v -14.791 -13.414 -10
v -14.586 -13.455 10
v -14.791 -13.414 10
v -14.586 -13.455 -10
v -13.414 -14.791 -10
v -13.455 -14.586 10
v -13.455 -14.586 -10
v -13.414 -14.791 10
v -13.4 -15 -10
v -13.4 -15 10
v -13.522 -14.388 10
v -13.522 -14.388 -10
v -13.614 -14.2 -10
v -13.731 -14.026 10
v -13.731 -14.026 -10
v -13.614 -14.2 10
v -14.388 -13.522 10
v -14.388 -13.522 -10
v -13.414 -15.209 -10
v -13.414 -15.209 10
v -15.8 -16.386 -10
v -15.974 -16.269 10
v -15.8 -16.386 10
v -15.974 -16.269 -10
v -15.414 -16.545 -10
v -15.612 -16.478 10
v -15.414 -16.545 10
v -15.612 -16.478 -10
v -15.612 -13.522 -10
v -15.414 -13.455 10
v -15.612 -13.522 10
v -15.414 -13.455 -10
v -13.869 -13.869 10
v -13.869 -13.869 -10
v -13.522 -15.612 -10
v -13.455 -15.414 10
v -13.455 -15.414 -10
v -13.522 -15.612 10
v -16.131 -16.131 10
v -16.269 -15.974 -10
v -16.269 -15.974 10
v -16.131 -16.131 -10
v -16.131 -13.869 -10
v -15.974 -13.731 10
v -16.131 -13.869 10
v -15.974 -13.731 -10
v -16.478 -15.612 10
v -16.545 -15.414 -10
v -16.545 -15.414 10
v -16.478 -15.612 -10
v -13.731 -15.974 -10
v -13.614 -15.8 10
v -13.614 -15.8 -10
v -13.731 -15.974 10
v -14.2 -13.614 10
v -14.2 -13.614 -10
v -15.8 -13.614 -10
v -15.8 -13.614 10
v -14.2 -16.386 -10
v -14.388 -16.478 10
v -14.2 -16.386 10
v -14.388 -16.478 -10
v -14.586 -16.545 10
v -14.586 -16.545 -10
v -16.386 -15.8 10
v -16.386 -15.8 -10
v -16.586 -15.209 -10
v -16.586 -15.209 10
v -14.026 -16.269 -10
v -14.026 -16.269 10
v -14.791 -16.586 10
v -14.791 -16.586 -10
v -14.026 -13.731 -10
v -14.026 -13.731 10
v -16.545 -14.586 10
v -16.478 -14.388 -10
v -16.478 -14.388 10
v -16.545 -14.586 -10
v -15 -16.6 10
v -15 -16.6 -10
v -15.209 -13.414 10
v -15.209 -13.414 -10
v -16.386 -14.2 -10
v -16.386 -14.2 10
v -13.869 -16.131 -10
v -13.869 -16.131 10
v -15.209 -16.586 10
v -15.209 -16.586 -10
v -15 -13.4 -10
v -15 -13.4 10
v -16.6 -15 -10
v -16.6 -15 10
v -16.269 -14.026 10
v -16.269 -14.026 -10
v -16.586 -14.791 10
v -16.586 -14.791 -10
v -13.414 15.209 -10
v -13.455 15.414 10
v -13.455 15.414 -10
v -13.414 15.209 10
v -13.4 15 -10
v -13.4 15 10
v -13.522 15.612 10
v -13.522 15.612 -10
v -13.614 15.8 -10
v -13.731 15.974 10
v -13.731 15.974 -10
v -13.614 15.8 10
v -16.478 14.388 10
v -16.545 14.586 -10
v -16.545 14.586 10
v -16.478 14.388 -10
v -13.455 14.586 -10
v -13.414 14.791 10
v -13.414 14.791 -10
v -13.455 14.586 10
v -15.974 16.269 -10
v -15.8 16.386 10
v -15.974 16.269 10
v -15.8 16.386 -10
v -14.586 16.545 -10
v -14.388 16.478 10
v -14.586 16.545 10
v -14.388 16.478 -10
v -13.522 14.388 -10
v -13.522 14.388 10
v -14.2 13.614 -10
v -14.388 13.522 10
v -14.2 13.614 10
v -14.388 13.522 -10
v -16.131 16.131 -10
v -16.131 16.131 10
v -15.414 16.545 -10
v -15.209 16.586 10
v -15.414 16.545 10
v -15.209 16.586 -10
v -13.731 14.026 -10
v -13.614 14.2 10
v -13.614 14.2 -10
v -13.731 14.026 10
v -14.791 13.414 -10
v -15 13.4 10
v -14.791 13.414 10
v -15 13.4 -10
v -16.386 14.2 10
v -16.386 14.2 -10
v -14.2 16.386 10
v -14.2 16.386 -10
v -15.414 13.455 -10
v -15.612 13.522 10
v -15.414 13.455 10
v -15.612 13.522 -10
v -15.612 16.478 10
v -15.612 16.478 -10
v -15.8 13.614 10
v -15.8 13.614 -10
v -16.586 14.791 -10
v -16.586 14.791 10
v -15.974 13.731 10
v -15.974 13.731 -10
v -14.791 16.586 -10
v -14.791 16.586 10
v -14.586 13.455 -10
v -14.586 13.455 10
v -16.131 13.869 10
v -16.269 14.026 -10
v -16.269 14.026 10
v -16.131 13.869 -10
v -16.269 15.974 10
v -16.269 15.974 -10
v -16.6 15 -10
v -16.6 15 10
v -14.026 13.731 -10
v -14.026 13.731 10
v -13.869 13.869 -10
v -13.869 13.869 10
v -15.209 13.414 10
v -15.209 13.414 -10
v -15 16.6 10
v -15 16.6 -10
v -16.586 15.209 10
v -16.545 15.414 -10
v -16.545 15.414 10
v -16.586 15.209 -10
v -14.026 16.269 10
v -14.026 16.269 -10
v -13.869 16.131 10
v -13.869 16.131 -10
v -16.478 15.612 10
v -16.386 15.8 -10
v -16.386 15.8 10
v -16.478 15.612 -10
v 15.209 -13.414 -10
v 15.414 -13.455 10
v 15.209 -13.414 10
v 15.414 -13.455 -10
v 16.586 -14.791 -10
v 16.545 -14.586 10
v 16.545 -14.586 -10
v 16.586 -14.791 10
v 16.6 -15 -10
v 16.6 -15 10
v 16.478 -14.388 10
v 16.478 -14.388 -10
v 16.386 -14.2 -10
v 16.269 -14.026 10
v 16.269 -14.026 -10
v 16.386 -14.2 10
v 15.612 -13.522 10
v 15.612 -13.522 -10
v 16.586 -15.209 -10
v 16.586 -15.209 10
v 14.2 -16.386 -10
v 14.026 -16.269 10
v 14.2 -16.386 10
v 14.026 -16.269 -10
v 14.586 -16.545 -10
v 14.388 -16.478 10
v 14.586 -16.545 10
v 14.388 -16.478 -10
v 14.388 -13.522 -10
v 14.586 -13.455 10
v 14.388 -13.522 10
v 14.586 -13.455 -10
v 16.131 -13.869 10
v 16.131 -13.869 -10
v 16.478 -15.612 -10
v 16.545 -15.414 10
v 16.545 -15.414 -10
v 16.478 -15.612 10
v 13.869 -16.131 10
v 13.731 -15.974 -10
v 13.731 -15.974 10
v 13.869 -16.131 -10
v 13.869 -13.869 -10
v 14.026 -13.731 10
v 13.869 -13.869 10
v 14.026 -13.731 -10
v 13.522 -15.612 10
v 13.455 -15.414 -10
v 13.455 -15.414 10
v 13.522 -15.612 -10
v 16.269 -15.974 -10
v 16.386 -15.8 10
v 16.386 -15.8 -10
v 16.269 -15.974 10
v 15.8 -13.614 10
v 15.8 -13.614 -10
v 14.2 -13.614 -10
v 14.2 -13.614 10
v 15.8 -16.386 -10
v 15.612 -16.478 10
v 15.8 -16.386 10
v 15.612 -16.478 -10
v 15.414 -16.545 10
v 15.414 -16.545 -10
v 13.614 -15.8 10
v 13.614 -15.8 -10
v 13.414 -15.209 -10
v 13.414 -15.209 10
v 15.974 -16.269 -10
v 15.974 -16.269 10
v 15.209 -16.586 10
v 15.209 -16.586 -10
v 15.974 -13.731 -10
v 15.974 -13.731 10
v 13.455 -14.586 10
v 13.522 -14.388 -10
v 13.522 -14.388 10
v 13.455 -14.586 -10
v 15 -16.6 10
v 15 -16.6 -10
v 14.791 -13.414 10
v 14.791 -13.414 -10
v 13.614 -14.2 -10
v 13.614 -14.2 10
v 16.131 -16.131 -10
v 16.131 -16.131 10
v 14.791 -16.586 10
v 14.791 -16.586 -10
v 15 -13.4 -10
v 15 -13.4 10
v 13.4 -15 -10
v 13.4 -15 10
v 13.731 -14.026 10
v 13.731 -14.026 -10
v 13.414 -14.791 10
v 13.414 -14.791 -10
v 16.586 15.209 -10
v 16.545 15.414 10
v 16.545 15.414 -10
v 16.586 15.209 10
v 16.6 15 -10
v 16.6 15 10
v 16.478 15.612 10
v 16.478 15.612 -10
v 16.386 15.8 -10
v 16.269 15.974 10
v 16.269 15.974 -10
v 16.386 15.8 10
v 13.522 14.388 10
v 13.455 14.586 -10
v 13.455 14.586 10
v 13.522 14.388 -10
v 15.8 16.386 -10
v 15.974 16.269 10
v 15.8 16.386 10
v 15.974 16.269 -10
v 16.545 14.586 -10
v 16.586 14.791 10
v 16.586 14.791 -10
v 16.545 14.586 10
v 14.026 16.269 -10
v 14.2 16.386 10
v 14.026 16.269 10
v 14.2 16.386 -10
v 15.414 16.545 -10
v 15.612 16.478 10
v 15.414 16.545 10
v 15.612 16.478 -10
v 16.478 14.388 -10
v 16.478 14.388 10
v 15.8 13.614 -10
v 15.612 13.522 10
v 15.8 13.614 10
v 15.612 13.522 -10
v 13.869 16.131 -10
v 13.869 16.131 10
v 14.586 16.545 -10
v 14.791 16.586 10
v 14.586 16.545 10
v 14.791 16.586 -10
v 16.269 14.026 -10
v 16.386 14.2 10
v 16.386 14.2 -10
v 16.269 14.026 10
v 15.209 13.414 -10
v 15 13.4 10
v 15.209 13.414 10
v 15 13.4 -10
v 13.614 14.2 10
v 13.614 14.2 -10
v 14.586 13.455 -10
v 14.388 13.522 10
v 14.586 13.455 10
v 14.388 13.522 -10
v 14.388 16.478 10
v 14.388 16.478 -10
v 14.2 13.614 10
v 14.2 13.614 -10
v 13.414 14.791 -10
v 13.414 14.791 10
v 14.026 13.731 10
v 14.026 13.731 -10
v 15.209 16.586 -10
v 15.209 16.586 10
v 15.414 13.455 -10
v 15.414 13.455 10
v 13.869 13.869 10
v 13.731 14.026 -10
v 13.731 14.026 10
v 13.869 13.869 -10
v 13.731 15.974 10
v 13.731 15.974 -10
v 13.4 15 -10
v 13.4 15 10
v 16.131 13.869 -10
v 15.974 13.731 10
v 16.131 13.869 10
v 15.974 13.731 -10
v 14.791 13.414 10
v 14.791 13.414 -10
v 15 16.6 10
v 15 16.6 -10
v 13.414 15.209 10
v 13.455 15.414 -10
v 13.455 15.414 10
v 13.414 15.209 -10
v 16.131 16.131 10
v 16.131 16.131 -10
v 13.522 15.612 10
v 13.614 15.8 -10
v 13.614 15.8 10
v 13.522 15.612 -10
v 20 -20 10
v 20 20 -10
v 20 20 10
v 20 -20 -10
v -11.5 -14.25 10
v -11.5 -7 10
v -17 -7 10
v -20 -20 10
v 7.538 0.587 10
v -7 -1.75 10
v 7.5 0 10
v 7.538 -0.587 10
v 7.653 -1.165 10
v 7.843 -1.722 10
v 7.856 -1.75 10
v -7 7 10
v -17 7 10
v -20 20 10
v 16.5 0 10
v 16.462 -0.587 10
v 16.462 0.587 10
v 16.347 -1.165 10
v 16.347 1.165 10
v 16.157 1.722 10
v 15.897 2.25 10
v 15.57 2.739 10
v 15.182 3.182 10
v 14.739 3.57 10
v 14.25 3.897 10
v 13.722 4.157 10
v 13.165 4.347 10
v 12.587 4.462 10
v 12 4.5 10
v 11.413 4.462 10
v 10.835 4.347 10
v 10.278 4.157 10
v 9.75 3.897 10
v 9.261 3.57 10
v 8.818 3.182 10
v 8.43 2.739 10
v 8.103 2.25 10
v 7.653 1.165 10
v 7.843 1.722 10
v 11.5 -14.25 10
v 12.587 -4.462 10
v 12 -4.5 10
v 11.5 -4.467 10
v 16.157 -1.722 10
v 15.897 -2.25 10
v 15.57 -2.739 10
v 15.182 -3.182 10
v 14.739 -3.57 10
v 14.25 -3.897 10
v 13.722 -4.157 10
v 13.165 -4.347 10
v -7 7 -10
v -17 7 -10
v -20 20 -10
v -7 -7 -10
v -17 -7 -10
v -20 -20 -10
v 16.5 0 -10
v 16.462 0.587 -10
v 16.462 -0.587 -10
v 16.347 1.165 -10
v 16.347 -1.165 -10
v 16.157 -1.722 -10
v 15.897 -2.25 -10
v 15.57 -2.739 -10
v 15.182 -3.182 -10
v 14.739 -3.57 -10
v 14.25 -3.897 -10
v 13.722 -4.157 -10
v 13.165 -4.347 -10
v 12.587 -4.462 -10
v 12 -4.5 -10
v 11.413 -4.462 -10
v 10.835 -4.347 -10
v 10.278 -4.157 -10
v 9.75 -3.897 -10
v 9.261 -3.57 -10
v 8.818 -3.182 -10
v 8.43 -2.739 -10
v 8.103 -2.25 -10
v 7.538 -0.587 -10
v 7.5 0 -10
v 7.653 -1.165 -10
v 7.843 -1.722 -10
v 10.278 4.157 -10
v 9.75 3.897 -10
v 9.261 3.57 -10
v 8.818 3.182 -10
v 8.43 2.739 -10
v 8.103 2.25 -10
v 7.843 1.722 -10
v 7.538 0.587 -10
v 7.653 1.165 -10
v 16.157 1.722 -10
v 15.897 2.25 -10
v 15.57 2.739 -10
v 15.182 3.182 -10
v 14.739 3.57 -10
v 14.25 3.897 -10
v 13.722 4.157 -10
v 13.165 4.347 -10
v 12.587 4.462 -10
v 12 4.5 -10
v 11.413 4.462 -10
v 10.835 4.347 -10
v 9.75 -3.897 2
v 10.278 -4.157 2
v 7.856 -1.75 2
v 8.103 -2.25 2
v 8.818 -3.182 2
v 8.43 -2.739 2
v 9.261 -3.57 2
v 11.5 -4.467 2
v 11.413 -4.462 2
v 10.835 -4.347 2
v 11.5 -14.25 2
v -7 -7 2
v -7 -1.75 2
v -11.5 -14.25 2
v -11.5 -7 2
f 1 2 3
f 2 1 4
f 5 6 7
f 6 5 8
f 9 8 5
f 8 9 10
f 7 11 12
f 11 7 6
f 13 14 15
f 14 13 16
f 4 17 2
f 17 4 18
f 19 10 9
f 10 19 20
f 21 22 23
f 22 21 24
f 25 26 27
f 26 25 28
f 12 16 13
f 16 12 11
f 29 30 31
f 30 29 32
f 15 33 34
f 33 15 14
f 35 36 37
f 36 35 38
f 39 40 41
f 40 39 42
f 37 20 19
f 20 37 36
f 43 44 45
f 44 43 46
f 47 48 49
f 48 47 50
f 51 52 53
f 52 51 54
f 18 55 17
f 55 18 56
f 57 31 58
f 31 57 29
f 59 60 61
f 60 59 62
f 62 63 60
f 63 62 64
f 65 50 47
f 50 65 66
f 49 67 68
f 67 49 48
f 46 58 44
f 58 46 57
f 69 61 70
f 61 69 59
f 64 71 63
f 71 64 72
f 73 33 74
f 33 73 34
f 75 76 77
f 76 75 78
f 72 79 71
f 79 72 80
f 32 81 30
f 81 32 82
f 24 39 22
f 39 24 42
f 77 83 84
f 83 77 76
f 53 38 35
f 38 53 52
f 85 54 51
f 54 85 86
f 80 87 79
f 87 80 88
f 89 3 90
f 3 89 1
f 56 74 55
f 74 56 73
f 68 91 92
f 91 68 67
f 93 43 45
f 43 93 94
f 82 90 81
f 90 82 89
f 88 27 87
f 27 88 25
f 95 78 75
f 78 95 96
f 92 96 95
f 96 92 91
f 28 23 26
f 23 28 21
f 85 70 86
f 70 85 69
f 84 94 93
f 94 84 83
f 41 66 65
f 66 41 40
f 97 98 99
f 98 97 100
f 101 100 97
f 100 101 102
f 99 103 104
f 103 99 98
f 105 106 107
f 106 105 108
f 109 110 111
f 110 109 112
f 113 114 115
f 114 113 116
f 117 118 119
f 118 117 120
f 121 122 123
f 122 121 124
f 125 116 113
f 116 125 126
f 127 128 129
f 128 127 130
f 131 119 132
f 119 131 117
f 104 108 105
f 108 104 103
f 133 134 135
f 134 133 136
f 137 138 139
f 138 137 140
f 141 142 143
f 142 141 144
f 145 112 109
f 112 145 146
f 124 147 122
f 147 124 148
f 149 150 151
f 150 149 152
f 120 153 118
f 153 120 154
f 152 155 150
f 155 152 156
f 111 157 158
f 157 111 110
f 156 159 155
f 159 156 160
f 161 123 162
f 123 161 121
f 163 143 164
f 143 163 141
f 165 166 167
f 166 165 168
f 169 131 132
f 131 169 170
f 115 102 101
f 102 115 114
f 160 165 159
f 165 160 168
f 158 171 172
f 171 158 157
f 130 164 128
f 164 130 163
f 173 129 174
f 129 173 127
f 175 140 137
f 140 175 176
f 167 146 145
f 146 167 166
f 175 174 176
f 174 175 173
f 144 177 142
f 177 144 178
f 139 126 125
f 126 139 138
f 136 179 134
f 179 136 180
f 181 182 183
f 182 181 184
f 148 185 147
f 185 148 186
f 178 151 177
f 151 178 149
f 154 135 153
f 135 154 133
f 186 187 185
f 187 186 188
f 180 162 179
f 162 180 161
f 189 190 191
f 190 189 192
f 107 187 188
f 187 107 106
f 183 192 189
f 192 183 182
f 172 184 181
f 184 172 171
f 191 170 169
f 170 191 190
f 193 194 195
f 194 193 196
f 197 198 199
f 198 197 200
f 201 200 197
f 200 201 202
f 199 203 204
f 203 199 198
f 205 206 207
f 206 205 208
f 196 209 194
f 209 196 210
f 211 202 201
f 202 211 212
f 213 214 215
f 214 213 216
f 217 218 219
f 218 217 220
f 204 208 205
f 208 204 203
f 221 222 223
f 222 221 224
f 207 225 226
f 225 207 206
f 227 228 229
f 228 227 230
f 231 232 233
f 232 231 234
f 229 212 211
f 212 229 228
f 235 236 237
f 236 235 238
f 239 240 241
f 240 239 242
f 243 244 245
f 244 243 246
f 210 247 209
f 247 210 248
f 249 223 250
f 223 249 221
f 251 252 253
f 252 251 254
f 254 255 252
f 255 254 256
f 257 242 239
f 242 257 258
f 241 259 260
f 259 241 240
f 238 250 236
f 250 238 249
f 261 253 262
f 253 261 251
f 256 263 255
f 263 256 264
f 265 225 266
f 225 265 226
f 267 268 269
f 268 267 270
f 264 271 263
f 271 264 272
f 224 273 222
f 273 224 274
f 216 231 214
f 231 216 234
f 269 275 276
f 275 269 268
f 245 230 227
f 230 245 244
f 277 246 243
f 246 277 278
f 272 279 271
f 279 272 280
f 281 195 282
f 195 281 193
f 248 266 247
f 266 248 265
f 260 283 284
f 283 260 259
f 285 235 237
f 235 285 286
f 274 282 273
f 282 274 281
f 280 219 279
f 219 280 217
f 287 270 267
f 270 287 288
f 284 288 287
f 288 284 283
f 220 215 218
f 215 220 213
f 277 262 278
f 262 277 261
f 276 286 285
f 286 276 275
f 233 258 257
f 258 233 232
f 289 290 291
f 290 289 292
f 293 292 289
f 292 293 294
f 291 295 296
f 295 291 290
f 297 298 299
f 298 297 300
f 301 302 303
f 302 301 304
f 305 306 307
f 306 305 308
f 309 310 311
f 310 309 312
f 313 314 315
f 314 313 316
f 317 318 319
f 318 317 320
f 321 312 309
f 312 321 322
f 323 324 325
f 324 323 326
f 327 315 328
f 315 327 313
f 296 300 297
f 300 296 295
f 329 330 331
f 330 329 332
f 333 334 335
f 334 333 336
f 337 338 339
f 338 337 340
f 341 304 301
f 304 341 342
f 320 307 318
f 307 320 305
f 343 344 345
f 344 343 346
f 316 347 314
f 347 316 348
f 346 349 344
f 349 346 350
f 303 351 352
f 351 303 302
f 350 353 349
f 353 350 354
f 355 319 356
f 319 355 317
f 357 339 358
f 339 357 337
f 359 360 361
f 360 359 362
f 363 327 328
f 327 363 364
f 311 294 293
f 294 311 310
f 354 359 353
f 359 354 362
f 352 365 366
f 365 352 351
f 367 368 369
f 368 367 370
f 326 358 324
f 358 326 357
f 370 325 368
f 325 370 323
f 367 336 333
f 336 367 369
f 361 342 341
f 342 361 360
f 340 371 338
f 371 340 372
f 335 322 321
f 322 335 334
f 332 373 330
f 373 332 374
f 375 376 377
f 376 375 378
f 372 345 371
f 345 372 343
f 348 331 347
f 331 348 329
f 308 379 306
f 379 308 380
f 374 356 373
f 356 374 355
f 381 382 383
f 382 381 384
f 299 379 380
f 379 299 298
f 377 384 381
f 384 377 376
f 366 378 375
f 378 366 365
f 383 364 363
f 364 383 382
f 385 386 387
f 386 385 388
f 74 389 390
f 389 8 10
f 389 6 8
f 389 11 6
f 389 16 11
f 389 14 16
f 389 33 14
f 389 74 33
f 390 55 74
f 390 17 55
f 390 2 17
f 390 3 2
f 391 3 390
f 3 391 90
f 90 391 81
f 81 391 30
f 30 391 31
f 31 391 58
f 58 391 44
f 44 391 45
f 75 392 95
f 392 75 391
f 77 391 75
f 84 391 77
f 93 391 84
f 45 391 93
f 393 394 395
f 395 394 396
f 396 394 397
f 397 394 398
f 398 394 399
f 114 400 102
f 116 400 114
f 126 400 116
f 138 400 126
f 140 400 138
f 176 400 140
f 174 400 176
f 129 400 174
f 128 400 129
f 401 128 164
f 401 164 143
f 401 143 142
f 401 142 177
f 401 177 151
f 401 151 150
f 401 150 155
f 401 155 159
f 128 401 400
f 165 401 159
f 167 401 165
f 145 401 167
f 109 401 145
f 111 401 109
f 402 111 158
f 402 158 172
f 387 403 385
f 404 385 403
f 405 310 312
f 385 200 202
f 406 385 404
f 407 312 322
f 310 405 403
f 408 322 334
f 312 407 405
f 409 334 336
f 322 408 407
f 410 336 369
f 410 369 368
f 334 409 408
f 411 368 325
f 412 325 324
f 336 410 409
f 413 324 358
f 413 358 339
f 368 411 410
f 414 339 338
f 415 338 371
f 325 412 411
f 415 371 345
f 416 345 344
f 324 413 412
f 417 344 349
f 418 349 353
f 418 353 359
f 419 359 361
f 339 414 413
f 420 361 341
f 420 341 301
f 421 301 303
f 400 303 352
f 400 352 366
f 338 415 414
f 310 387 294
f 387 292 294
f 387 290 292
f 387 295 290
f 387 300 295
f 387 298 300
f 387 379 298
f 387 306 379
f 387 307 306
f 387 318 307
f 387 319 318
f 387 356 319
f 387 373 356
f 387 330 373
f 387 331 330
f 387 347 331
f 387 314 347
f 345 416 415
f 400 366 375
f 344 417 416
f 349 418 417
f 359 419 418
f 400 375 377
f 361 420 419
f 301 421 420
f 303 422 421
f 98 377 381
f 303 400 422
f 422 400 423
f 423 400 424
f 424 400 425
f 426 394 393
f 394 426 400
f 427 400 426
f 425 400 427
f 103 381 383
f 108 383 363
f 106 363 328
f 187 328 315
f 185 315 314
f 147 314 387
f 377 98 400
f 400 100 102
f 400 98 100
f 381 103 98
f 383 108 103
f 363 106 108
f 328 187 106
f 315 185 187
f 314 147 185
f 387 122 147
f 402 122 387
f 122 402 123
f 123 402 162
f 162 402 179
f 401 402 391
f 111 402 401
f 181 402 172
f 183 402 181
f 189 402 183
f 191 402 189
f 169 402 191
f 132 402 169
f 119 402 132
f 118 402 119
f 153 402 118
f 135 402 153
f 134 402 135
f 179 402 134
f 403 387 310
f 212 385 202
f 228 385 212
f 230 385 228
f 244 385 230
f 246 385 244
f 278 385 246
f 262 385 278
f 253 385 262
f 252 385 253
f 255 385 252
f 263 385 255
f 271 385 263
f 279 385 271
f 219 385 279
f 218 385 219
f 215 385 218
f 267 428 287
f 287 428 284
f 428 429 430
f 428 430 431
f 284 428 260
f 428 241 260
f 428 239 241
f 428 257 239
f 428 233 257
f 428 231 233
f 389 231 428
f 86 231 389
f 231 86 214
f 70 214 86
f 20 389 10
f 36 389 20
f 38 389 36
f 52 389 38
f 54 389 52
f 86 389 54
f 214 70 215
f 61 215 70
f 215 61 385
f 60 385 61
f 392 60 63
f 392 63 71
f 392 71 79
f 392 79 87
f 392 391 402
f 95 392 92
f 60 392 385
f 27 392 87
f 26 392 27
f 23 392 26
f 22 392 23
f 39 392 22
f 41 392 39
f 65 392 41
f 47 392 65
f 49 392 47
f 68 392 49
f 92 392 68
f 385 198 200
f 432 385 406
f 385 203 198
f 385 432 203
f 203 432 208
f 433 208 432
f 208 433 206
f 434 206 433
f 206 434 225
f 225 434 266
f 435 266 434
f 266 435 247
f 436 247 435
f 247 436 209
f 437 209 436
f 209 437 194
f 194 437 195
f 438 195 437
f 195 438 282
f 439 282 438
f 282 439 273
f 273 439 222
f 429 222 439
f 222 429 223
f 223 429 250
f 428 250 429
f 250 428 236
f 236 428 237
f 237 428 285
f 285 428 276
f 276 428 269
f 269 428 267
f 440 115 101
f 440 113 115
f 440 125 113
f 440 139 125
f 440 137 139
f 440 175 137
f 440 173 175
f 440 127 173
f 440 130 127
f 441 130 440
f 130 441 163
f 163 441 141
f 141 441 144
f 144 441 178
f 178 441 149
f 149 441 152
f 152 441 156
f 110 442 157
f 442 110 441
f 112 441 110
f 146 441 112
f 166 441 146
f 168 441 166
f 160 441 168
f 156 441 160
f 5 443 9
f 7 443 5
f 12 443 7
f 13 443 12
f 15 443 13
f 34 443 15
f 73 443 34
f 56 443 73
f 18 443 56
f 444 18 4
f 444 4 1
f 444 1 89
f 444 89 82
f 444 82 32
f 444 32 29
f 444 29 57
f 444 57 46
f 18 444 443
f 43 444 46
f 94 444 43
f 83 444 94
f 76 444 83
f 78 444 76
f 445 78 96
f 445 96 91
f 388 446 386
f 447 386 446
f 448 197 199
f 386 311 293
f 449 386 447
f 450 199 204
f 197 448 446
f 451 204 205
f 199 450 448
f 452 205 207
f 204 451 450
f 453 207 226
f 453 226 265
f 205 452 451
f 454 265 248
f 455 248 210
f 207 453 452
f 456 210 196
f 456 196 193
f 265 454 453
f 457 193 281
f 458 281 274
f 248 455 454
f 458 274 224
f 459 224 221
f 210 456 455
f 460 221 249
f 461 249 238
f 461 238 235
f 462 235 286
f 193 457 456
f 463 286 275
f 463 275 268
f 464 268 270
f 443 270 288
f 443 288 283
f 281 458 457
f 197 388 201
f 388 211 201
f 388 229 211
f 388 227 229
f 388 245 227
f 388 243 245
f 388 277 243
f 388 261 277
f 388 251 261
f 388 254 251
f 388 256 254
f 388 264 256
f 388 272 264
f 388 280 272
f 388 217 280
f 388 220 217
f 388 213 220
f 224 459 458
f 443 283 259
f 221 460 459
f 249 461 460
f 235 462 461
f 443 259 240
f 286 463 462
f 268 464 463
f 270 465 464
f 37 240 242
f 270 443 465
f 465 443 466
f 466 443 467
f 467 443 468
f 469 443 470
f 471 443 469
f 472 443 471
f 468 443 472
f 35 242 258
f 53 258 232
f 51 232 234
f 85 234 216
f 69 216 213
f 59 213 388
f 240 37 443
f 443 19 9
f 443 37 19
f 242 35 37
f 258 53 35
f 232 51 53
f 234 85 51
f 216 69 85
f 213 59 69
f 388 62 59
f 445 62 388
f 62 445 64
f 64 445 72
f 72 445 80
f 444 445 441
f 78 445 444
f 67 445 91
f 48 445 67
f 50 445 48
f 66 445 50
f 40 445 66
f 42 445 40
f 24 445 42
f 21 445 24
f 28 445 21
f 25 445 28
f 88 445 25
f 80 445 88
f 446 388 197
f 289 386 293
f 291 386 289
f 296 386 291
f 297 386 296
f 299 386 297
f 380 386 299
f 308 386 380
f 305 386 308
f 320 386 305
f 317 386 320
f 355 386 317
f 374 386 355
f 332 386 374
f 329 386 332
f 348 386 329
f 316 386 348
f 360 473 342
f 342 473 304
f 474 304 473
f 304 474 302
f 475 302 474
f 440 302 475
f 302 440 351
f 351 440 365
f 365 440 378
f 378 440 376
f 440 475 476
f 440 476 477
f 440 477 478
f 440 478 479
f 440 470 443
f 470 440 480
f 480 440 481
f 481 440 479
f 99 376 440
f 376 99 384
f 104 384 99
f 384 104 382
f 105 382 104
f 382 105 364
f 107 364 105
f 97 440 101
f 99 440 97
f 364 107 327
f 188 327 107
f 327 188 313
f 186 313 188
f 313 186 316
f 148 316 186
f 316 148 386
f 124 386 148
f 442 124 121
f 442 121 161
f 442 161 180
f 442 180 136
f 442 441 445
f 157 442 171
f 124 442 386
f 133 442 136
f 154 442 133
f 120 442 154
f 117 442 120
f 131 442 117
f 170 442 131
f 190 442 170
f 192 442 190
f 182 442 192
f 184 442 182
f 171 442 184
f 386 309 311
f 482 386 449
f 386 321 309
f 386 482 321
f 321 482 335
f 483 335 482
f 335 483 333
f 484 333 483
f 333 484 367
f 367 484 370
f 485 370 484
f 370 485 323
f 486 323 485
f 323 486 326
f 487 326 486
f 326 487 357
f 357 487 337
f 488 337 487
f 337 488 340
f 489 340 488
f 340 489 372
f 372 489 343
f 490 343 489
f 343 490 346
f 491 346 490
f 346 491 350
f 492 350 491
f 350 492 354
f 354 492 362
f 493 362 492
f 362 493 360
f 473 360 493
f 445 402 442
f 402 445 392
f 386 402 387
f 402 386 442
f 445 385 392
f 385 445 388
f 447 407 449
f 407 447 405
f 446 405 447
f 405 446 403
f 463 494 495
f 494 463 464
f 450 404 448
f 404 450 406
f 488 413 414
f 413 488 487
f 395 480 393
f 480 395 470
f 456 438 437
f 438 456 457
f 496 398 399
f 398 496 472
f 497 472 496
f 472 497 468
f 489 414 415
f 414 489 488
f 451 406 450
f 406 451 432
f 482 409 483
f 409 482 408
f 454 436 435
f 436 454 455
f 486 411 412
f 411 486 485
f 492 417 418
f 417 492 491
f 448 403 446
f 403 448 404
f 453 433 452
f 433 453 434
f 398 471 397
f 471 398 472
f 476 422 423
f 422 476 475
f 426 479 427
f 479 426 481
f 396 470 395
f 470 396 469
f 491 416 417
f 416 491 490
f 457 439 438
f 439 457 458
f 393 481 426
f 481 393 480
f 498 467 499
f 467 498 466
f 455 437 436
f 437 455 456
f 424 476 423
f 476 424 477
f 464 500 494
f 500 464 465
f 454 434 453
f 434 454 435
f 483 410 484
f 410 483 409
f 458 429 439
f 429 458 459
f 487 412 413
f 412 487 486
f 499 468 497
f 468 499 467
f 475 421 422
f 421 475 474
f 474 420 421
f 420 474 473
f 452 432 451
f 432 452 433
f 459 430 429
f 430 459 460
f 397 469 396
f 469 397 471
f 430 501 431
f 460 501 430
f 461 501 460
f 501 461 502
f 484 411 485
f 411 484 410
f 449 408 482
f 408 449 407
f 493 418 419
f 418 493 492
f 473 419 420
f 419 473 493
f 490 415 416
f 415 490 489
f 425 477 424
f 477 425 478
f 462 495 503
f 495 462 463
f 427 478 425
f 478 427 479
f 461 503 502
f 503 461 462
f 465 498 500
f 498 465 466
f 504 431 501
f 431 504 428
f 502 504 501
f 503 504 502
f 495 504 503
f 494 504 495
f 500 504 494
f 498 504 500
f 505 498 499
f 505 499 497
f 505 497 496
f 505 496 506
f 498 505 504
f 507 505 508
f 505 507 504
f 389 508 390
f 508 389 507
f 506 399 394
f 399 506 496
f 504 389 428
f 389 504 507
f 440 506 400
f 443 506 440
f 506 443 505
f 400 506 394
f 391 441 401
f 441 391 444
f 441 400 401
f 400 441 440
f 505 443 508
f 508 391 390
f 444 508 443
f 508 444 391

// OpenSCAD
// file: cad_config.scad
// Shared dimensions for the reference toolhead, in millimetres.
//
// These constants are mirrored by `constants:` in cad/manifest.yaml and
// by the collision primitives in steropes/gantry.py — the drift guard in
// tests/test_cadimport.py fails if any of the three diverge.

CARRIAGE_W = 40;                    // X width  (2 * gantry.CARRIAGE_HALF_MM[0])
CARRIAGE_D = 40;                    // Y depth  (2 * gantry.CARRIAGE_HALF_MM[1])
CARRIAGE_H = 20;                    // Z height (2 * gantry.CARRIAGE_HALF_MM[2])

FINGER_DIA = 8;                     // plunger shaft Ø (2 * gantry.FINGER_RADIUS_MM)
FINGER_LEN = 30;                    // shaft length (2 * gantry.FINGER_HALF_LEN_MM)
FINGER_OFFSET = [12, 0, -25];       // toolhead frame (gantry.FINGER_OFFSET_MM)
TOOLCAM_OFFSET = [-12, 0, -11];     // toolhead frame (gantry.TOOLCAM_OFFSET_MM)

M3_CLEAR = 3.2;                     // M3 clearance hole

SERVO_W = 23;                       // 9 g servo body, for the carriage pocket
SERVO_D = 12.5;
SERVO_H = 8;

$fn = 48;
// main file
// Carriage plate: the toolhead's backbone, riding the gantry rails.
// Authored in the toolhead body frame — origin at the carriage centre,
// Z up — so the exported STL drops into the MJCF `toolhead` body with
// no offset.
//
// Export: openscad -o carriage_plate.stl -D 'PART="carriage_plate"' carriage_plate.scad
include <cad_config.scad>

PART = "preview";

module carriage_plate() {
    difference() {
        cube([CARRIAGE_W, CARRIAGE_D, CARRIAGE_H], center = true);

        // M3 mounting holes, one per corner, 5 mm in from the edges
        for (sx = [-1, 1], sy = [-1, 1])
            translate([sx * (CARRIAGE_W / 2 - 5), sy * (CARRIAGE_D / 2 - 5), 0])
                cylinder(d = M3_CLEAR, h = CARRIAGE_H + 2, center = true);

        // finger bore through the plate at the plunger's XY offset
        translate([FINGER_OFFSET[0], FINGER_OFFSET[1], 0])
            cylinder(d = FINGER_DIA + 1, h = CARRIAGE_H + 2, center = true);

        // servo pocket open at the top face (9 g servo body)
        translate([0, -8, CARRIAGE_H / 2 - SERVO_H / 2 + 0.5])
            cube([SERVO_W, SERVO_D, SERVO_H + 1], center = true);

        // toolcam cable pass-through at the camera's XY offset
        translate([TOOLCAM_OFFSET[0], TOOLCAM_OFFSET[1], 0])
            cube([10, 14, CARRIAGE_H + 2], center = true);
    }
}

if (PART == "preview" || PART == "carriage_plate")
    carriage_plate();
